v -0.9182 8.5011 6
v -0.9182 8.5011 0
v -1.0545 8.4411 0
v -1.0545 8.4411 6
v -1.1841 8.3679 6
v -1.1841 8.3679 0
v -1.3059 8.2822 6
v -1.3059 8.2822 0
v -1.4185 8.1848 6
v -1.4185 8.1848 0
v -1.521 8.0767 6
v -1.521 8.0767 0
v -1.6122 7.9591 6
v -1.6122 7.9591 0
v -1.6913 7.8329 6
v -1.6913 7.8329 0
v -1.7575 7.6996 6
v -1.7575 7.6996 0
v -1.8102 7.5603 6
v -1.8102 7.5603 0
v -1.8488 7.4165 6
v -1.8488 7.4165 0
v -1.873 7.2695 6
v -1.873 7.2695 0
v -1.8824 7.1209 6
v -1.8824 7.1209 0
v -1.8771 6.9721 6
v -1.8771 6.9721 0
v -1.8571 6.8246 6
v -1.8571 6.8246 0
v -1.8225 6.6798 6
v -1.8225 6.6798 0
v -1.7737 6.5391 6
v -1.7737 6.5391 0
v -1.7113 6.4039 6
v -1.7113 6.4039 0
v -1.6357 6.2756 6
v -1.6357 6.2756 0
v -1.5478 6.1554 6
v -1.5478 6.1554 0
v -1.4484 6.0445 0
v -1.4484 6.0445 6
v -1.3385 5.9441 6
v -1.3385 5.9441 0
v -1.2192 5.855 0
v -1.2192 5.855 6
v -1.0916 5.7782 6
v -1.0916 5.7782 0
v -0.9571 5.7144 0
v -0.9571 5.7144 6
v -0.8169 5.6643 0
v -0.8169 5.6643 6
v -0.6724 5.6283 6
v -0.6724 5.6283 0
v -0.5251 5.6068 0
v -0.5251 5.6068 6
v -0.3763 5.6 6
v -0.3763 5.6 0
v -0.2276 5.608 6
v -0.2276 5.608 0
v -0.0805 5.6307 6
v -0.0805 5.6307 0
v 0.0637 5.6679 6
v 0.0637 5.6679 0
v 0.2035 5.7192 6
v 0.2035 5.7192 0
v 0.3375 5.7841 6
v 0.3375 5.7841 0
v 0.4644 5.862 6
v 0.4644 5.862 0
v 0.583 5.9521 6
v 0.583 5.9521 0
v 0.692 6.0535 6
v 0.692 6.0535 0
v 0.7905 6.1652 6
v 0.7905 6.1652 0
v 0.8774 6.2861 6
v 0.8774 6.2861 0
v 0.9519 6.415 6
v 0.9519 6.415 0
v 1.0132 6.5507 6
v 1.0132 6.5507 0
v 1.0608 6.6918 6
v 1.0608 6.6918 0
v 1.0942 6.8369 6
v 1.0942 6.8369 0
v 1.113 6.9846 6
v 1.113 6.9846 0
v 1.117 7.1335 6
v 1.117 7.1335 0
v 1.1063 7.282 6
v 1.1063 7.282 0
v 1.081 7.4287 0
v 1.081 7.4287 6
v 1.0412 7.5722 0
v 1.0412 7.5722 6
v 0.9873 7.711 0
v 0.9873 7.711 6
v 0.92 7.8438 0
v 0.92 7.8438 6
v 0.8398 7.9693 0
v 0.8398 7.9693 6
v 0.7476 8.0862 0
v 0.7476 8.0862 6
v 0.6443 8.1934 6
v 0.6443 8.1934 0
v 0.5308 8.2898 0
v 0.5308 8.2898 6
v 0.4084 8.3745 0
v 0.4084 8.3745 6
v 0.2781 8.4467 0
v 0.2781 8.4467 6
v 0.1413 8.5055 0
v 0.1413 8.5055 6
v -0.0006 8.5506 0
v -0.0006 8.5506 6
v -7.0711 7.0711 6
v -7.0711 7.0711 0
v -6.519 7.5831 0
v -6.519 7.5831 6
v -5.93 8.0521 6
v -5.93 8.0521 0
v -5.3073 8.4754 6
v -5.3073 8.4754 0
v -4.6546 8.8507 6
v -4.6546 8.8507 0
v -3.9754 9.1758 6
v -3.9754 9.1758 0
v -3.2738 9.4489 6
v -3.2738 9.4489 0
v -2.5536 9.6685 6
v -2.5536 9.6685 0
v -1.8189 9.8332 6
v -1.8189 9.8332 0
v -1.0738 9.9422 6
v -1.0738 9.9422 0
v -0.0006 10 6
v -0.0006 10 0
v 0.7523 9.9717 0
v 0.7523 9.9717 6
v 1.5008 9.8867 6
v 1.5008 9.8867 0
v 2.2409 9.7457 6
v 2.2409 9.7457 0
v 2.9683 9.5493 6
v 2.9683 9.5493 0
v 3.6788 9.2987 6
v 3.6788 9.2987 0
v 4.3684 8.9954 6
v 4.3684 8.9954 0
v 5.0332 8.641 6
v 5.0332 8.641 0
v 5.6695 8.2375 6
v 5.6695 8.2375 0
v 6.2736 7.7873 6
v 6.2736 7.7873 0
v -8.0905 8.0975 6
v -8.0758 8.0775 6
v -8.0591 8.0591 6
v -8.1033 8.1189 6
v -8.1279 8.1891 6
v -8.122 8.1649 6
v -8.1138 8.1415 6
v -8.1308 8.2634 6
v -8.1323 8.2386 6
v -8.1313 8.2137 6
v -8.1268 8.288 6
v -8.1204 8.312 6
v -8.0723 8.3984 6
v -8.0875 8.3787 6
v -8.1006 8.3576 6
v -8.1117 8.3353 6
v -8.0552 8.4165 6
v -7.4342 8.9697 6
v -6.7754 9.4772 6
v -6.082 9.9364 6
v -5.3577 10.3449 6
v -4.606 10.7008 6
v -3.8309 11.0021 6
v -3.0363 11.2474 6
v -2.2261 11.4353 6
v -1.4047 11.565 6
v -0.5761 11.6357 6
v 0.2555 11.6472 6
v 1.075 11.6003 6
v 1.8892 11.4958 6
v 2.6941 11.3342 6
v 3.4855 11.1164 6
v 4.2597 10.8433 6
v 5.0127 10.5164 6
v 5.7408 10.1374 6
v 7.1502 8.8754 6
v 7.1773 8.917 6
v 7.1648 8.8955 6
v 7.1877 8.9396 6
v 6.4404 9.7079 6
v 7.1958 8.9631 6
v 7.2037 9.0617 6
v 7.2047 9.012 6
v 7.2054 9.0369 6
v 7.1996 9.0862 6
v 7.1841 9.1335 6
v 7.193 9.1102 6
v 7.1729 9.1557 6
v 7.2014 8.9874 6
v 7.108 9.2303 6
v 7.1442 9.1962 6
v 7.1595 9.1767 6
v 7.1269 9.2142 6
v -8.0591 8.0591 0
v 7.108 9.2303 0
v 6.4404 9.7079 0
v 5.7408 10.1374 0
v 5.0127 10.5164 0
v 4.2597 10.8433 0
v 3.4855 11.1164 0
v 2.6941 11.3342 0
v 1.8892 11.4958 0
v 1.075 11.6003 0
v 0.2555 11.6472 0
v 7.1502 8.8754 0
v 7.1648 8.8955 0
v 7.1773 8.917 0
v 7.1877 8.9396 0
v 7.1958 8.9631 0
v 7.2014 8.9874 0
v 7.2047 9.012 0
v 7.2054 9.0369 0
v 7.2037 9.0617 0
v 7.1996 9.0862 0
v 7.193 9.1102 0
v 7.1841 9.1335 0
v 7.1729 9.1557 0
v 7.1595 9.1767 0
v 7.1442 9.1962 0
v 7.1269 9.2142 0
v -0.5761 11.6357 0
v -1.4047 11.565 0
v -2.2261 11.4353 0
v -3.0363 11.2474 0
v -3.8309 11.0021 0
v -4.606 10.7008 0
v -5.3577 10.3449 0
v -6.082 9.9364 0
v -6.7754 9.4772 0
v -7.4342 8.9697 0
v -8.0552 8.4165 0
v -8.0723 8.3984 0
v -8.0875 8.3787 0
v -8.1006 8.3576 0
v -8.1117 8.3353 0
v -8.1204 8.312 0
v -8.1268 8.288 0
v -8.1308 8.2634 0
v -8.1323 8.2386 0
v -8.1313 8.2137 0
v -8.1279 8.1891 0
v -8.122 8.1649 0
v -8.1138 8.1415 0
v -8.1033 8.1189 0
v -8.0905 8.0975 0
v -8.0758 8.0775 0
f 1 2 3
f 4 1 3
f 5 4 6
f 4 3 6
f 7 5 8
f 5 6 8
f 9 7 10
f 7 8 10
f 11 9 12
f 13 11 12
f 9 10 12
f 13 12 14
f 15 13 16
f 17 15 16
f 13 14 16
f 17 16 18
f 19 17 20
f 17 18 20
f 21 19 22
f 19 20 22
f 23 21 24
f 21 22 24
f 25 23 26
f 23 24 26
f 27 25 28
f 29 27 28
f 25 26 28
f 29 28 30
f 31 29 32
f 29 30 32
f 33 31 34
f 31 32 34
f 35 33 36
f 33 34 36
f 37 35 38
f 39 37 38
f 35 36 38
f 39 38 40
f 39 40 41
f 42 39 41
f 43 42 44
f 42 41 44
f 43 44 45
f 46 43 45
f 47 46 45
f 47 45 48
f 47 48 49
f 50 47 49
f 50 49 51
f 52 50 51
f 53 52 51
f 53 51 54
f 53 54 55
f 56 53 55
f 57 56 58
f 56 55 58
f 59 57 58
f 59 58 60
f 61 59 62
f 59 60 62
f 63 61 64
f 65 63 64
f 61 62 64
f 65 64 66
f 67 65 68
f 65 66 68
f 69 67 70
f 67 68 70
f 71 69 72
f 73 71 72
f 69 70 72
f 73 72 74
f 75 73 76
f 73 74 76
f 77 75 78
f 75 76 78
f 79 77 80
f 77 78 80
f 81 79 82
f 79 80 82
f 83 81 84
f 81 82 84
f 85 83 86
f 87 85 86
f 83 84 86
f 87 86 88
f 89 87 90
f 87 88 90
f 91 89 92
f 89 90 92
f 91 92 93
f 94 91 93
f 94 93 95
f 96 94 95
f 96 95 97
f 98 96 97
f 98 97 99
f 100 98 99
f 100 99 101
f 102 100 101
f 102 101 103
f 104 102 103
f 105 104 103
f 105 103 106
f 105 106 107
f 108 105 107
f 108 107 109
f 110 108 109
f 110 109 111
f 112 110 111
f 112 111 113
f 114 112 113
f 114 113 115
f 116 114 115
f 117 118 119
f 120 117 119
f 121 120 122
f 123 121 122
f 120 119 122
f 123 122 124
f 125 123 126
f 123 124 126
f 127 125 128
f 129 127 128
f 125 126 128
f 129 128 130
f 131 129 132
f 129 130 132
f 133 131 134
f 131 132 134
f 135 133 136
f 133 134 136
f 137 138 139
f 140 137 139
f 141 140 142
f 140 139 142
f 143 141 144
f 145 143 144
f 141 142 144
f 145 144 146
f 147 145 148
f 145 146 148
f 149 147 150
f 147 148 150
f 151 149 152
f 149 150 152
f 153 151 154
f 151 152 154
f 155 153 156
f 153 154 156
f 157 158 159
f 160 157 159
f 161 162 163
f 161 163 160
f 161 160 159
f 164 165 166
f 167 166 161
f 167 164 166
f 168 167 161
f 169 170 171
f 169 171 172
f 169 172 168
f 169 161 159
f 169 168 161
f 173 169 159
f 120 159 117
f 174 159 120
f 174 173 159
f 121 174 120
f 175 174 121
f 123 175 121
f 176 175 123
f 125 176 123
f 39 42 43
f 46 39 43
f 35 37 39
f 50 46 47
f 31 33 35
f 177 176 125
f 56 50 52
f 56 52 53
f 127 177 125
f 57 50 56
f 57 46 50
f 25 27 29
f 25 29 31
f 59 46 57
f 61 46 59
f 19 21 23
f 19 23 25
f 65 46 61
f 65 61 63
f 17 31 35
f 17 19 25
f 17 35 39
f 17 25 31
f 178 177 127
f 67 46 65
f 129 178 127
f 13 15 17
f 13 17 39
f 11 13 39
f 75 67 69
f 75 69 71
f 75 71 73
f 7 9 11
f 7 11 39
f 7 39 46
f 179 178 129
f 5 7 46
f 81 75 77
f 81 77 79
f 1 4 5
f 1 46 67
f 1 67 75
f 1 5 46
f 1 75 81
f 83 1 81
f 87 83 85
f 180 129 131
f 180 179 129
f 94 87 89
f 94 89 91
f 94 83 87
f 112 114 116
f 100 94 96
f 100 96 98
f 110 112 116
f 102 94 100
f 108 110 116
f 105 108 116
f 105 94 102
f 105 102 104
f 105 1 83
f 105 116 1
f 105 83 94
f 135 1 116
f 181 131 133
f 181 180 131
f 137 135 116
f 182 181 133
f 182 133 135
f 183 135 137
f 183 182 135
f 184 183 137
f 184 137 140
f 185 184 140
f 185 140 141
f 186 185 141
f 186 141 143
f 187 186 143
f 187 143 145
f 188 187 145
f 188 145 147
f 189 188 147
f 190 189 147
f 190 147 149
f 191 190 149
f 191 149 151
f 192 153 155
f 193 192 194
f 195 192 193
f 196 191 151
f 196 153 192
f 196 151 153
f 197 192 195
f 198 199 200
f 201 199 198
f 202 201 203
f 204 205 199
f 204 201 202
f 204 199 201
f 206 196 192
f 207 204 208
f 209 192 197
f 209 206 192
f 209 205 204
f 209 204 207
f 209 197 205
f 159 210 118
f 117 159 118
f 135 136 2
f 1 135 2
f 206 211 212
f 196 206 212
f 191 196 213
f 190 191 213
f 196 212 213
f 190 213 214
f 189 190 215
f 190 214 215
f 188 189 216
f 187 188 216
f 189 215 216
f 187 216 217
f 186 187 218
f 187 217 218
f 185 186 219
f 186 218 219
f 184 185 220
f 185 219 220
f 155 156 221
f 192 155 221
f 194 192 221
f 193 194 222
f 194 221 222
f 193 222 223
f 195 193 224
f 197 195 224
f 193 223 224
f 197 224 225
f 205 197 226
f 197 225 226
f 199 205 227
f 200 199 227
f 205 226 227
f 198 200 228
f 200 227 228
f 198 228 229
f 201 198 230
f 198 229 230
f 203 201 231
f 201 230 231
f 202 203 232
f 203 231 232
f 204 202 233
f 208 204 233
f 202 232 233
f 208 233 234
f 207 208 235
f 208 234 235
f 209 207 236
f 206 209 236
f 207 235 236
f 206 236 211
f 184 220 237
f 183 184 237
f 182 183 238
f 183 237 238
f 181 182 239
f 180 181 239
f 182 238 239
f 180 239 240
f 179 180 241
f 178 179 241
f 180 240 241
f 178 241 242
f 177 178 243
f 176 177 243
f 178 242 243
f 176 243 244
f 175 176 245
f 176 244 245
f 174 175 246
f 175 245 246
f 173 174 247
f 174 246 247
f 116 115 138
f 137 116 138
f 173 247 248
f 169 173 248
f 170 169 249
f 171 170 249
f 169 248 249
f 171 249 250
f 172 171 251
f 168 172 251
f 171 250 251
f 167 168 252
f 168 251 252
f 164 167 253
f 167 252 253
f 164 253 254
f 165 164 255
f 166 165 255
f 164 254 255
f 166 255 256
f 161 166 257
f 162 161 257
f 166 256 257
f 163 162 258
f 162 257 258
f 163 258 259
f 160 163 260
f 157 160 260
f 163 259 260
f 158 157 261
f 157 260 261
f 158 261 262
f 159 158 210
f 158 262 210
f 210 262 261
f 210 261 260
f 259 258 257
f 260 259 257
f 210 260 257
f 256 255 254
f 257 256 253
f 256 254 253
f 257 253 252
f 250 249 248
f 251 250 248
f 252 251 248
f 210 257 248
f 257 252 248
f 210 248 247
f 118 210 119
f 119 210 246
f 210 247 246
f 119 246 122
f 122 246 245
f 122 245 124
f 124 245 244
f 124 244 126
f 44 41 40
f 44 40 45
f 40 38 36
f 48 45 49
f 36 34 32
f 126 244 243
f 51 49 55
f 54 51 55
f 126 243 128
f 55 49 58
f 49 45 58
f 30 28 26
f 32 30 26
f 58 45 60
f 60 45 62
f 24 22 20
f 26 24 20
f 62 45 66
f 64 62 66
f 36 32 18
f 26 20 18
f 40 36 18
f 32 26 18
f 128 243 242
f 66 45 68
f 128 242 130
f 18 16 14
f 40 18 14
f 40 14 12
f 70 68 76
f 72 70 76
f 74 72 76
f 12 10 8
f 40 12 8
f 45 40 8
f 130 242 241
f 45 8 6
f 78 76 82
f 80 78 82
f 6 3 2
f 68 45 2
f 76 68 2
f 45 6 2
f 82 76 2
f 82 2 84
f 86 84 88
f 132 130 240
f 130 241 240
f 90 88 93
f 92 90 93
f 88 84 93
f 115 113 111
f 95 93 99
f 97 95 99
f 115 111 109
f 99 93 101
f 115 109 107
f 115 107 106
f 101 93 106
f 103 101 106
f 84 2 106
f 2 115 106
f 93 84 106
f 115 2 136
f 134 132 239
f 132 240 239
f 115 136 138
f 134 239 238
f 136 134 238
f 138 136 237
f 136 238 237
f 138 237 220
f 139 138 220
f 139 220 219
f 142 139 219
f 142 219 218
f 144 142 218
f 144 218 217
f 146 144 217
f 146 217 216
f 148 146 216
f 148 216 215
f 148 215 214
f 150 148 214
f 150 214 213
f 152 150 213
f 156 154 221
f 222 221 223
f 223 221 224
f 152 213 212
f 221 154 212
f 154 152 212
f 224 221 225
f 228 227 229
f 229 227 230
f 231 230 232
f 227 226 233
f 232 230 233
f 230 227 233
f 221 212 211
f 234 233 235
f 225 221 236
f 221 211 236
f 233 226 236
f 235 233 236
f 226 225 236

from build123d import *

# Parameters (mm, degrees)
F1_DEPTH = 6


with BuildPart() as f1:
    # F0 (on Top) → F1 (new body)
    with BuildSketch(Plane.XY):
        with BuildLine():
            ThreePointArc((-8.05516, 8.416466), (-8.132287, 8.238597), (-8.059079, 8.059079))
            Line((-8.059079, 8.059079), (-7.071068, 7.071068))
            ThreePointArc((-7.071068, 7.071068), (-4.31807, 9.01966), (-1.073848, 9.942175))
            Line((-1.073848, 9.942175), (-0.918199, 8.50111))
            ThreePointArc((-0.918199, 8.50111), (-0.301868, 5.602173), (-0.000613, 8.550553))
            Line((-0.000613, 8.550553), (-0.000613, 10))
            ThreePointArc((-0.000613, 10), (3.325891, 9.430718), (6.273586, 7.787305))
            Line((6.273586, 7.787305), (7.150168, 8.875393))
            ThreePointArc((7.150168, 8.875393), (7.203741, 9.061715), (7.108018, 9.230308))
            ThreePointArc((7.108018, 9.230308), (3.875, 10.986668), (0.255482, 11.647198))
            ThreePointArc((0.255482, 11.647198), (-4.221155, 10.858377), (-8.05516, 8.416466))
        make_face()
    extrude(amount=F1_DEPTH)


solid = f1.part
